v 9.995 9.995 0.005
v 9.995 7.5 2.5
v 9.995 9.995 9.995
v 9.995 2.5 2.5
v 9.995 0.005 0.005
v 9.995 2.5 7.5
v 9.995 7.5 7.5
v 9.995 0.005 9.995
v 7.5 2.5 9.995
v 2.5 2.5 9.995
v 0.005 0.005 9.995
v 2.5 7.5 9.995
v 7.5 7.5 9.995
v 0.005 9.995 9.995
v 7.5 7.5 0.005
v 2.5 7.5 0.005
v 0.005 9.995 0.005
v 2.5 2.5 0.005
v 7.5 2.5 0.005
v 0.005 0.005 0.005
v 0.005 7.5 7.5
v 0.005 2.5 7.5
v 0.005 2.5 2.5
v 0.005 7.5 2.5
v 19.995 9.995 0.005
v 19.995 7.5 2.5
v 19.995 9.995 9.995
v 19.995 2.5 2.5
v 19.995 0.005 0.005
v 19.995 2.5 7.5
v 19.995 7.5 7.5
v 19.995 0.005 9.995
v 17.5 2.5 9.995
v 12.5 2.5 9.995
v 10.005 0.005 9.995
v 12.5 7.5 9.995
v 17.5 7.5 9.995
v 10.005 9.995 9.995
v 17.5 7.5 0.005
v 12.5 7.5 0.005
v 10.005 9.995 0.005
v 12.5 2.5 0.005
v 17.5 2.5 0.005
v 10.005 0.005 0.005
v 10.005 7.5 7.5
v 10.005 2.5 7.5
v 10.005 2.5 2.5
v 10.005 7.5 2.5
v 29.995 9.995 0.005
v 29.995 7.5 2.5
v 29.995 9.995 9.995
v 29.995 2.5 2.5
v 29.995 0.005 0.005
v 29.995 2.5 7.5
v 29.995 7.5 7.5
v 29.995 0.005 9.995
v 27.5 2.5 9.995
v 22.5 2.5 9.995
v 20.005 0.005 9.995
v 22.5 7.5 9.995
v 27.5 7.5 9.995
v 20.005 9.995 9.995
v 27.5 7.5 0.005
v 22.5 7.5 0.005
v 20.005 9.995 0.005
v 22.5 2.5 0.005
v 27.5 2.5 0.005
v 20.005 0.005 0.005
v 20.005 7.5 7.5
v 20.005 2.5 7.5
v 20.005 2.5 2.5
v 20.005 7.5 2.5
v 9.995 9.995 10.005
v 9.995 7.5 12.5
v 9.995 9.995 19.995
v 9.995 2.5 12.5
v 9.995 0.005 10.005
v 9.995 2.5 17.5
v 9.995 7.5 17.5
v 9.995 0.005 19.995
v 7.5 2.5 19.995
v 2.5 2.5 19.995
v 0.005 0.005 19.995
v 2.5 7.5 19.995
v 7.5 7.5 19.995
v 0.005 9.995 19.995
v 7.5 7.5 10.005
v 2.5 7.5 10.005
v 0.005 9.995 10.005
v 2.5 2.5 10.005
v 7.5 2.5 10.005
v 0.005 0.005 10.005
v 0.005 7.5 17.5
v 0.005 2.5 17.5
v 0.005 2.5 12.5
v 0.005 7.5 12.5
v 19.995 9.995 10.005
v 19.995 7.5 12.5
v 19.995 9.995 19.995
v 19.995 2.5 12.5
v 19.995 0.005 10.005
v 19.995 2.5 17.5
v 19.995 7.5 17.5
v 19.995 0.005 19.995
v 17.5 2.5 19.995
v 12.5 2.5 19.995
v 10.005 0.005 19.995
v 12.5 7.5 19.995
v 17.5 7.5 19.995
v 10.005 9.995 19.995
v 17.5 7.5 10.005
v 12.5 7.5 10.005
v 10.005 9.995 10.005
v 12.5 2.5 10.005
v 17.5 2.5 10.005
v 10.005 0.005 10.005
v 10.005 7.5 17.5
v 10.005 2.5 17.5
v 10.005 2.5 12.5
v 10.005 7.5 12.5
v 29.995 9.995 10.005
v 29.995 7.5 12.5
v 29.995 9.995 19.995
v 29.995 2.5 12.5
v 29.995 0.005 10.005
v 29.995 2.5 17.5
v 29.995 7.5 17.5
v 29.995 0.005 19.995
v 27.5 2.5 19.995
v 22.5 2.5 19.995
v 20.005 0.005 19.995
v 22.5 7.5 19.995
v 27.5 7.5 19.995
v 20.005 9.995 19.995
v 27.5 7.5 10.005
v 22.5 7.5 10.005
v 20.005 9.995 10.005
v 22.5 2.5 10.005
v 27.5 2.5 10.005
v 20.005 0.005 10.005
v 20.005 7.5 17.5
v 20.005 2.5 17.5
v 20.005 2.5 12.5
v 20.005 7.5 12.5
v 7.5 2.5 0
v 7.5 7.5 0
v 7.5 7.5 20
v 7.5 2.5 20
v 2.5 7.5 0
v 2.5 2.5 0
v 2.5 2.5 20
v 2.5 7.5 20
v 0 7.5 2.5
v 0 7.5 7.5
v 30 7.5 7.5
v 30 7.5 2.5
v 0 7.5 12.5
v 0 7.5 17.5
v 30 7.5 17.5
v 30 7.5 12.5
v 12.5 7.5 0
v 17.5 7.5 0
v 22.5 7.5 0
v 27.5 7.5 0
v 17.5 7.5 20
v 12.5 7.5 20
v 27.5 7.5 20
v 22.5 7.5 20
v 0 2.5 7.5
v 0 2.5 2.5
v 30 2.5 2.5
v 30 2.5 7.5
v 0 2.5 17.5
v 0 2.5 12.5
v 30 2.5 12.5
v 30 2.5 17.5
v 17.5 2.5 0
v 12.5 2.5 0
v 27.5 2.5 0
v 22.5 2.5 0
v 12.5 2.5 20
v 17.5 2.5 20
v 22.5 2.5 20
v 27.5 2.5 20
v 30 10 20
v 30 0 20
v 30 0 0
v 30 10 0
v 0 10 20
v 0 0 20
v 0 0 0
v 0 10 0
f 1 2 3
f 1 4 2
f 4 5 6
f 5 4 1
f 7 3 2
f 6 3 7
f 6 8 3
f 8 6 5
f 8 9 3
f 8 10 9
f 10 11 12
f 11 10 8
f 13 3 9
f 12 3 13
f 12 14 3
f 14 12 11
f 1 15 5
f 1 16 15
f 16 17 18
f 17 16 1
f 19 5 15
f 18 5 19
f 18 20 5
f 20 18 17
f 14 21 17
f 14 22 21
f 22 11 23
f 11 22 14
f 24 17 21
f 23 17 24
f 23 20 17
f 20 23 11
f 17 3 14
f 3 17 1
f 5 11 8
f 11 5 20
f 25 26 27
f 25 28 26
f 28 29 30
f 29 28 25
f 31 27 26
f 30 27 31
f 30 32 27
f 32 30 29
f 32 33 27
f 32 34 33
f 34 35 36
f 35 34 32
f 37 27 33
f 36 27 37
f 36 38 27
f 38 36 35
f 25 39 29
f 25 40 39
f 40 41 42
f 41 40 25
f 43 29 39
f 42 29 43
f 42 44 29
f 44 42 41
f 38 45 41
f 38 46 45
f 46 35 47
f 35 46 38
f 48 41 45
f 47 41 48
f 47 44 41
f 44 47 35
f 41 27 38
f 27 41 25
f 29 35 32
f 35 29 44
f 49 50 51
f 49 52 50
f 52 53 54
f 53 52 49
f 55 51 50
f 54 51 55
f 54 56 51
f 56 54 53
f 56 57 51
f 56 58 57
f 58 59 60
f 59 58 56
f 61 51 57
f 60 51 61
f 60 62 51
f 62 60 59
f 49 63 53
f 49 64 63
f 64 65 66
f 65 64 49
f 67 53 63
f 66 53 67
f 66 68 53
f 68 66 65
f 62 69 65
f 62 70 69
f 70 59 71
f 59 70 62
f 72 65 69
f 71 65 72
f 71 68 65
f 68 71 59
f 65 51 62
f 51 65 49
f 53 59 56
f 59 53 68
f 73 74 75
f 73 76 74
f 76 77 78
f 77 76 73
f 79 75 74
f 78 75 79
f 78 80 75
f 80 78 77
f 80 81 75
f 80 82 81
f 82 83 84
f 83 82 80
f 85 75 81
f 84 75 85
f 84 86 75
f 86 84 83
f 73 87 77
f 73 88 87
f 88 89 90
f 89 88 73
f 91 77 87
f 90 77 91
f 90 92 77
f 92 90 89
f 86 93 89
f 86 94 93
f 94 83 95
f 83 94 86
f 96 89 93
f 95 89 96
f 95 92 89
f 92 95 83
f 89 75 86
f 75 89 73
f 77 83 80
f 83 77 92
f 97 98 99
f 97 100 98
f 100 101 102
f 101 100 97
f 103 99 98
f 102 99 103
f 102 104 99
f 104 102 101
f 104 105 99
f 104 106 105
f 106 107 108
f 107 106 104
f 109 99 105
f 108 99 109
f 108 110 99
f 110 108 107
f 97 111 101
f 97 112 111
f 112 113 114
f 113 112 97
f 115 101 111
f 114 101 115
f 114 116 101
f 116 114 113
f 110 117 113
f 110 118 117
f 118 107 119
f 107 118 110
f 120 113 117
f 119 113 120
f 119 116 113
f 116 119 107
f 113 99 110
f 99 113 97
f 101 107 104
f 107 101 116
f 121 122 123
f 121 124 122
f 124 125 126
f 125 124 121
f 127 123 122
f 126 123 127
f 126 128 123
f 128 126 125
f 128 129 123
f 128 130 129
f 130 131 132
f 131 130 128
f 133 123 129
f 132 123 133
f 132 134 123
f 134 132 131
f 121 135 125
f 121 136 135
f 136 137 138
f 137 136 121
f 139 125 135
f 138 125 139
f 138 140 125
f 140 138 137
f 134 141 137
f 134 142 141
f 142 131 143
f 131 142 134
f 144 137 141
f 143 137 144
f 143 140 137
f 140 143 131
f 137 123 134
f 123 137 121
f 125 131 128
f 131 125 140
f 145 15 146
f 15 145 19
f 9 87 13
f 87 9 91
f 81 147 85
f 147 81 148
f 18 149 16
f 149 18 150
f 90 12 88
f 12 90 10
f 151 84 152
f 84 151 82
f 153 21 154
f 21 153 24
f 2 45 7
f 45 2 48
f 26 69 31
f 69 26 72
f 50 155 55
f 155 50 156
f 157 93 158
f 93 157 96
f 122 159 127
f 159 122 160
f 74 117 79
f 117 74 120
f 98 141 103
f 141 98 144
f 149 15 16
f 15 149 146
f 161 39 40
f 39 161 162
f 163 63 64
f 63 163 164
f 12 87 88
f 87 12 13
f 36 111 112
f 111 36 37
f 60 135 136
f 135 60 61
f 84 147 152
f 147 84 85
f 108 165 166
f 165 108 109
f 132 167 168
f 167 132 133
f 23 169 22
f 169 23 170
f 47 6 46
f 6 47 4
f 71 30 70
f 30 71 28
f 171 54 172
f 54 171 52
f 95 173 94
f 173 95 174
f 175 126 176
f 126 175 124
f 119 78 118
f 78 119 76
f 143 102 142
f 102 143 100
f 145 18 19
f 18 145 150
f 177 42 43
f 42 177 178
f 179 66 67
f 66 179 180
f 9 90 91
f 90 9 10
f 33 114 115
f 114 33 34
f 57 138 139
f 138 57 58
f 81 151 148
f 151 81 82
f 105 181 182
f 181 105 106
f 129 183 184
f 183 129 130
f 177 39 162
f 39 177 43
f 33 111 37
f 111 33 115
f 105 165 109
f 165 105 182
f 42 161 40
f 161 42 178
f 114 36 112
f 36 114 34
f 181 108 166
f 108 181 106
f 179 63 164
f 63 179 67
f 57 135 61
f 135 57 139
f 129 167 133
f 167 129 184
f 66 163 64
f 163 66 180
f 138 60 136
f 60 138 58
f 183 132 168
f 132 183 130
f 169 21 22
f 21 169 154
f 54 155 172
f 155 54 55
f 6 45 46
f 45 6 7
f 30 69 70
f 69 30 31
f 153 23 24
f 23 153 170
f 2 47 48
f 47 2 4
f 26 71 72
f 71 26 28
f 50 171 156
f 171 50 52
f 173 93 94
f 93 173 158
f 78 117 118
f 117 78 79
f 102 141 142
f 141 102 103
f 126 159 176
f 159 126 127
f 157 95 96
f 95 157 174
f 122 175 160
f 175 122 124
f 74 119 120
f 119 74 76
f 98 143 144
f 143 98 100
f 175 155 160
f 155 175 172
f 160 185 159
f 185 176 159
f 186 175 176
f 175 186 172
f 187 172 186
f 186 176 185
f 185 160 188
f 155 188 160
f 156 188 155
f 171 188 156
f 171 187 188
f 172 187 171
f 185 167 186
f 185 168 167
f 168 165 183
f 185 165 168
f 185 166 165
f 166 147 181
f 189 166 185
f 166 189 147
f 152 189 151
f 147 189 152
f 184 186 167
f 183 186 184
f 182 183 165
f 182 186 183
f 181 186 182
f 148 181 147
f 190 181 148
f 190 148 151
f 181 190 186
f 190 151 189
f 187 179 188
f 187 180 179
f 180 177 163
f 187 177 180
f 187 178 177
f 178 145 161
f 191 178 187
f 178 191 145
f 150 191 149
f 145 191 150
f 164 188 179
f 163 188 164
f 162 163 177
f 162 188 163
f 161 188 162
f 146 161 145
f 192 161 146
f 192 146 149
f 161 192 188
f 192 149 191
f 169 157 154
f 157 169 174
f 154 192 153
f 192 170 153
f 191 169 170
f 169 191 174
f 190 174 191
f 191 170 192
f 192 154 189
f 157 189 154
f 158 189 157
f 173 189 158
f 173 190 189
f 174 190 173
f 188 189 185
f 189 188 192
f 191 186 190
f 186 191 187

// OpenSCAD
   
module rooms(wthick = .01){
    translate([wthick/2, wthick/2, wthick/2])cube(10-wthick, false);
    translate([10+wthick/2, wthick/2, wthick/2])cube(10-wthick, false);
    translate([20+wthick/2, wthick/2, wthick/2])cube(10-wthick, false);
    translate([wthick/2, wthick/2, 10+wthick/2])cube(10-wthick, false);
    translate([10+wthick/2, wthick/2, 10+wthick/2])cube(10-wthick, false);
    translate([20+wthick/2, wthick/2, 10+wthick/2])cube(10-wthick, false);
}

module windows(extend = .01){
    translate([5,5,10])cube([5,5,20+2*extend], true);
    translate([15,5,10])cube([5,5,20+2*extend], true);
    translate([25,5,10])cube([5,5,20+2*extend], true);
    translate([15,5,5])cube([30+2*extend,5,5], true);
    translate([15,5,15])cube([30+2*extend,5,5], true);
}

module house(wthick = .01){
    difference(){
        cube([30,10,20], false);
        rooms();
        windows();
    }
}

module domain(size=[160,160,160], offest=[5,5,0]){
    translate(offest)cube(size, false);
}


house(.01){}
